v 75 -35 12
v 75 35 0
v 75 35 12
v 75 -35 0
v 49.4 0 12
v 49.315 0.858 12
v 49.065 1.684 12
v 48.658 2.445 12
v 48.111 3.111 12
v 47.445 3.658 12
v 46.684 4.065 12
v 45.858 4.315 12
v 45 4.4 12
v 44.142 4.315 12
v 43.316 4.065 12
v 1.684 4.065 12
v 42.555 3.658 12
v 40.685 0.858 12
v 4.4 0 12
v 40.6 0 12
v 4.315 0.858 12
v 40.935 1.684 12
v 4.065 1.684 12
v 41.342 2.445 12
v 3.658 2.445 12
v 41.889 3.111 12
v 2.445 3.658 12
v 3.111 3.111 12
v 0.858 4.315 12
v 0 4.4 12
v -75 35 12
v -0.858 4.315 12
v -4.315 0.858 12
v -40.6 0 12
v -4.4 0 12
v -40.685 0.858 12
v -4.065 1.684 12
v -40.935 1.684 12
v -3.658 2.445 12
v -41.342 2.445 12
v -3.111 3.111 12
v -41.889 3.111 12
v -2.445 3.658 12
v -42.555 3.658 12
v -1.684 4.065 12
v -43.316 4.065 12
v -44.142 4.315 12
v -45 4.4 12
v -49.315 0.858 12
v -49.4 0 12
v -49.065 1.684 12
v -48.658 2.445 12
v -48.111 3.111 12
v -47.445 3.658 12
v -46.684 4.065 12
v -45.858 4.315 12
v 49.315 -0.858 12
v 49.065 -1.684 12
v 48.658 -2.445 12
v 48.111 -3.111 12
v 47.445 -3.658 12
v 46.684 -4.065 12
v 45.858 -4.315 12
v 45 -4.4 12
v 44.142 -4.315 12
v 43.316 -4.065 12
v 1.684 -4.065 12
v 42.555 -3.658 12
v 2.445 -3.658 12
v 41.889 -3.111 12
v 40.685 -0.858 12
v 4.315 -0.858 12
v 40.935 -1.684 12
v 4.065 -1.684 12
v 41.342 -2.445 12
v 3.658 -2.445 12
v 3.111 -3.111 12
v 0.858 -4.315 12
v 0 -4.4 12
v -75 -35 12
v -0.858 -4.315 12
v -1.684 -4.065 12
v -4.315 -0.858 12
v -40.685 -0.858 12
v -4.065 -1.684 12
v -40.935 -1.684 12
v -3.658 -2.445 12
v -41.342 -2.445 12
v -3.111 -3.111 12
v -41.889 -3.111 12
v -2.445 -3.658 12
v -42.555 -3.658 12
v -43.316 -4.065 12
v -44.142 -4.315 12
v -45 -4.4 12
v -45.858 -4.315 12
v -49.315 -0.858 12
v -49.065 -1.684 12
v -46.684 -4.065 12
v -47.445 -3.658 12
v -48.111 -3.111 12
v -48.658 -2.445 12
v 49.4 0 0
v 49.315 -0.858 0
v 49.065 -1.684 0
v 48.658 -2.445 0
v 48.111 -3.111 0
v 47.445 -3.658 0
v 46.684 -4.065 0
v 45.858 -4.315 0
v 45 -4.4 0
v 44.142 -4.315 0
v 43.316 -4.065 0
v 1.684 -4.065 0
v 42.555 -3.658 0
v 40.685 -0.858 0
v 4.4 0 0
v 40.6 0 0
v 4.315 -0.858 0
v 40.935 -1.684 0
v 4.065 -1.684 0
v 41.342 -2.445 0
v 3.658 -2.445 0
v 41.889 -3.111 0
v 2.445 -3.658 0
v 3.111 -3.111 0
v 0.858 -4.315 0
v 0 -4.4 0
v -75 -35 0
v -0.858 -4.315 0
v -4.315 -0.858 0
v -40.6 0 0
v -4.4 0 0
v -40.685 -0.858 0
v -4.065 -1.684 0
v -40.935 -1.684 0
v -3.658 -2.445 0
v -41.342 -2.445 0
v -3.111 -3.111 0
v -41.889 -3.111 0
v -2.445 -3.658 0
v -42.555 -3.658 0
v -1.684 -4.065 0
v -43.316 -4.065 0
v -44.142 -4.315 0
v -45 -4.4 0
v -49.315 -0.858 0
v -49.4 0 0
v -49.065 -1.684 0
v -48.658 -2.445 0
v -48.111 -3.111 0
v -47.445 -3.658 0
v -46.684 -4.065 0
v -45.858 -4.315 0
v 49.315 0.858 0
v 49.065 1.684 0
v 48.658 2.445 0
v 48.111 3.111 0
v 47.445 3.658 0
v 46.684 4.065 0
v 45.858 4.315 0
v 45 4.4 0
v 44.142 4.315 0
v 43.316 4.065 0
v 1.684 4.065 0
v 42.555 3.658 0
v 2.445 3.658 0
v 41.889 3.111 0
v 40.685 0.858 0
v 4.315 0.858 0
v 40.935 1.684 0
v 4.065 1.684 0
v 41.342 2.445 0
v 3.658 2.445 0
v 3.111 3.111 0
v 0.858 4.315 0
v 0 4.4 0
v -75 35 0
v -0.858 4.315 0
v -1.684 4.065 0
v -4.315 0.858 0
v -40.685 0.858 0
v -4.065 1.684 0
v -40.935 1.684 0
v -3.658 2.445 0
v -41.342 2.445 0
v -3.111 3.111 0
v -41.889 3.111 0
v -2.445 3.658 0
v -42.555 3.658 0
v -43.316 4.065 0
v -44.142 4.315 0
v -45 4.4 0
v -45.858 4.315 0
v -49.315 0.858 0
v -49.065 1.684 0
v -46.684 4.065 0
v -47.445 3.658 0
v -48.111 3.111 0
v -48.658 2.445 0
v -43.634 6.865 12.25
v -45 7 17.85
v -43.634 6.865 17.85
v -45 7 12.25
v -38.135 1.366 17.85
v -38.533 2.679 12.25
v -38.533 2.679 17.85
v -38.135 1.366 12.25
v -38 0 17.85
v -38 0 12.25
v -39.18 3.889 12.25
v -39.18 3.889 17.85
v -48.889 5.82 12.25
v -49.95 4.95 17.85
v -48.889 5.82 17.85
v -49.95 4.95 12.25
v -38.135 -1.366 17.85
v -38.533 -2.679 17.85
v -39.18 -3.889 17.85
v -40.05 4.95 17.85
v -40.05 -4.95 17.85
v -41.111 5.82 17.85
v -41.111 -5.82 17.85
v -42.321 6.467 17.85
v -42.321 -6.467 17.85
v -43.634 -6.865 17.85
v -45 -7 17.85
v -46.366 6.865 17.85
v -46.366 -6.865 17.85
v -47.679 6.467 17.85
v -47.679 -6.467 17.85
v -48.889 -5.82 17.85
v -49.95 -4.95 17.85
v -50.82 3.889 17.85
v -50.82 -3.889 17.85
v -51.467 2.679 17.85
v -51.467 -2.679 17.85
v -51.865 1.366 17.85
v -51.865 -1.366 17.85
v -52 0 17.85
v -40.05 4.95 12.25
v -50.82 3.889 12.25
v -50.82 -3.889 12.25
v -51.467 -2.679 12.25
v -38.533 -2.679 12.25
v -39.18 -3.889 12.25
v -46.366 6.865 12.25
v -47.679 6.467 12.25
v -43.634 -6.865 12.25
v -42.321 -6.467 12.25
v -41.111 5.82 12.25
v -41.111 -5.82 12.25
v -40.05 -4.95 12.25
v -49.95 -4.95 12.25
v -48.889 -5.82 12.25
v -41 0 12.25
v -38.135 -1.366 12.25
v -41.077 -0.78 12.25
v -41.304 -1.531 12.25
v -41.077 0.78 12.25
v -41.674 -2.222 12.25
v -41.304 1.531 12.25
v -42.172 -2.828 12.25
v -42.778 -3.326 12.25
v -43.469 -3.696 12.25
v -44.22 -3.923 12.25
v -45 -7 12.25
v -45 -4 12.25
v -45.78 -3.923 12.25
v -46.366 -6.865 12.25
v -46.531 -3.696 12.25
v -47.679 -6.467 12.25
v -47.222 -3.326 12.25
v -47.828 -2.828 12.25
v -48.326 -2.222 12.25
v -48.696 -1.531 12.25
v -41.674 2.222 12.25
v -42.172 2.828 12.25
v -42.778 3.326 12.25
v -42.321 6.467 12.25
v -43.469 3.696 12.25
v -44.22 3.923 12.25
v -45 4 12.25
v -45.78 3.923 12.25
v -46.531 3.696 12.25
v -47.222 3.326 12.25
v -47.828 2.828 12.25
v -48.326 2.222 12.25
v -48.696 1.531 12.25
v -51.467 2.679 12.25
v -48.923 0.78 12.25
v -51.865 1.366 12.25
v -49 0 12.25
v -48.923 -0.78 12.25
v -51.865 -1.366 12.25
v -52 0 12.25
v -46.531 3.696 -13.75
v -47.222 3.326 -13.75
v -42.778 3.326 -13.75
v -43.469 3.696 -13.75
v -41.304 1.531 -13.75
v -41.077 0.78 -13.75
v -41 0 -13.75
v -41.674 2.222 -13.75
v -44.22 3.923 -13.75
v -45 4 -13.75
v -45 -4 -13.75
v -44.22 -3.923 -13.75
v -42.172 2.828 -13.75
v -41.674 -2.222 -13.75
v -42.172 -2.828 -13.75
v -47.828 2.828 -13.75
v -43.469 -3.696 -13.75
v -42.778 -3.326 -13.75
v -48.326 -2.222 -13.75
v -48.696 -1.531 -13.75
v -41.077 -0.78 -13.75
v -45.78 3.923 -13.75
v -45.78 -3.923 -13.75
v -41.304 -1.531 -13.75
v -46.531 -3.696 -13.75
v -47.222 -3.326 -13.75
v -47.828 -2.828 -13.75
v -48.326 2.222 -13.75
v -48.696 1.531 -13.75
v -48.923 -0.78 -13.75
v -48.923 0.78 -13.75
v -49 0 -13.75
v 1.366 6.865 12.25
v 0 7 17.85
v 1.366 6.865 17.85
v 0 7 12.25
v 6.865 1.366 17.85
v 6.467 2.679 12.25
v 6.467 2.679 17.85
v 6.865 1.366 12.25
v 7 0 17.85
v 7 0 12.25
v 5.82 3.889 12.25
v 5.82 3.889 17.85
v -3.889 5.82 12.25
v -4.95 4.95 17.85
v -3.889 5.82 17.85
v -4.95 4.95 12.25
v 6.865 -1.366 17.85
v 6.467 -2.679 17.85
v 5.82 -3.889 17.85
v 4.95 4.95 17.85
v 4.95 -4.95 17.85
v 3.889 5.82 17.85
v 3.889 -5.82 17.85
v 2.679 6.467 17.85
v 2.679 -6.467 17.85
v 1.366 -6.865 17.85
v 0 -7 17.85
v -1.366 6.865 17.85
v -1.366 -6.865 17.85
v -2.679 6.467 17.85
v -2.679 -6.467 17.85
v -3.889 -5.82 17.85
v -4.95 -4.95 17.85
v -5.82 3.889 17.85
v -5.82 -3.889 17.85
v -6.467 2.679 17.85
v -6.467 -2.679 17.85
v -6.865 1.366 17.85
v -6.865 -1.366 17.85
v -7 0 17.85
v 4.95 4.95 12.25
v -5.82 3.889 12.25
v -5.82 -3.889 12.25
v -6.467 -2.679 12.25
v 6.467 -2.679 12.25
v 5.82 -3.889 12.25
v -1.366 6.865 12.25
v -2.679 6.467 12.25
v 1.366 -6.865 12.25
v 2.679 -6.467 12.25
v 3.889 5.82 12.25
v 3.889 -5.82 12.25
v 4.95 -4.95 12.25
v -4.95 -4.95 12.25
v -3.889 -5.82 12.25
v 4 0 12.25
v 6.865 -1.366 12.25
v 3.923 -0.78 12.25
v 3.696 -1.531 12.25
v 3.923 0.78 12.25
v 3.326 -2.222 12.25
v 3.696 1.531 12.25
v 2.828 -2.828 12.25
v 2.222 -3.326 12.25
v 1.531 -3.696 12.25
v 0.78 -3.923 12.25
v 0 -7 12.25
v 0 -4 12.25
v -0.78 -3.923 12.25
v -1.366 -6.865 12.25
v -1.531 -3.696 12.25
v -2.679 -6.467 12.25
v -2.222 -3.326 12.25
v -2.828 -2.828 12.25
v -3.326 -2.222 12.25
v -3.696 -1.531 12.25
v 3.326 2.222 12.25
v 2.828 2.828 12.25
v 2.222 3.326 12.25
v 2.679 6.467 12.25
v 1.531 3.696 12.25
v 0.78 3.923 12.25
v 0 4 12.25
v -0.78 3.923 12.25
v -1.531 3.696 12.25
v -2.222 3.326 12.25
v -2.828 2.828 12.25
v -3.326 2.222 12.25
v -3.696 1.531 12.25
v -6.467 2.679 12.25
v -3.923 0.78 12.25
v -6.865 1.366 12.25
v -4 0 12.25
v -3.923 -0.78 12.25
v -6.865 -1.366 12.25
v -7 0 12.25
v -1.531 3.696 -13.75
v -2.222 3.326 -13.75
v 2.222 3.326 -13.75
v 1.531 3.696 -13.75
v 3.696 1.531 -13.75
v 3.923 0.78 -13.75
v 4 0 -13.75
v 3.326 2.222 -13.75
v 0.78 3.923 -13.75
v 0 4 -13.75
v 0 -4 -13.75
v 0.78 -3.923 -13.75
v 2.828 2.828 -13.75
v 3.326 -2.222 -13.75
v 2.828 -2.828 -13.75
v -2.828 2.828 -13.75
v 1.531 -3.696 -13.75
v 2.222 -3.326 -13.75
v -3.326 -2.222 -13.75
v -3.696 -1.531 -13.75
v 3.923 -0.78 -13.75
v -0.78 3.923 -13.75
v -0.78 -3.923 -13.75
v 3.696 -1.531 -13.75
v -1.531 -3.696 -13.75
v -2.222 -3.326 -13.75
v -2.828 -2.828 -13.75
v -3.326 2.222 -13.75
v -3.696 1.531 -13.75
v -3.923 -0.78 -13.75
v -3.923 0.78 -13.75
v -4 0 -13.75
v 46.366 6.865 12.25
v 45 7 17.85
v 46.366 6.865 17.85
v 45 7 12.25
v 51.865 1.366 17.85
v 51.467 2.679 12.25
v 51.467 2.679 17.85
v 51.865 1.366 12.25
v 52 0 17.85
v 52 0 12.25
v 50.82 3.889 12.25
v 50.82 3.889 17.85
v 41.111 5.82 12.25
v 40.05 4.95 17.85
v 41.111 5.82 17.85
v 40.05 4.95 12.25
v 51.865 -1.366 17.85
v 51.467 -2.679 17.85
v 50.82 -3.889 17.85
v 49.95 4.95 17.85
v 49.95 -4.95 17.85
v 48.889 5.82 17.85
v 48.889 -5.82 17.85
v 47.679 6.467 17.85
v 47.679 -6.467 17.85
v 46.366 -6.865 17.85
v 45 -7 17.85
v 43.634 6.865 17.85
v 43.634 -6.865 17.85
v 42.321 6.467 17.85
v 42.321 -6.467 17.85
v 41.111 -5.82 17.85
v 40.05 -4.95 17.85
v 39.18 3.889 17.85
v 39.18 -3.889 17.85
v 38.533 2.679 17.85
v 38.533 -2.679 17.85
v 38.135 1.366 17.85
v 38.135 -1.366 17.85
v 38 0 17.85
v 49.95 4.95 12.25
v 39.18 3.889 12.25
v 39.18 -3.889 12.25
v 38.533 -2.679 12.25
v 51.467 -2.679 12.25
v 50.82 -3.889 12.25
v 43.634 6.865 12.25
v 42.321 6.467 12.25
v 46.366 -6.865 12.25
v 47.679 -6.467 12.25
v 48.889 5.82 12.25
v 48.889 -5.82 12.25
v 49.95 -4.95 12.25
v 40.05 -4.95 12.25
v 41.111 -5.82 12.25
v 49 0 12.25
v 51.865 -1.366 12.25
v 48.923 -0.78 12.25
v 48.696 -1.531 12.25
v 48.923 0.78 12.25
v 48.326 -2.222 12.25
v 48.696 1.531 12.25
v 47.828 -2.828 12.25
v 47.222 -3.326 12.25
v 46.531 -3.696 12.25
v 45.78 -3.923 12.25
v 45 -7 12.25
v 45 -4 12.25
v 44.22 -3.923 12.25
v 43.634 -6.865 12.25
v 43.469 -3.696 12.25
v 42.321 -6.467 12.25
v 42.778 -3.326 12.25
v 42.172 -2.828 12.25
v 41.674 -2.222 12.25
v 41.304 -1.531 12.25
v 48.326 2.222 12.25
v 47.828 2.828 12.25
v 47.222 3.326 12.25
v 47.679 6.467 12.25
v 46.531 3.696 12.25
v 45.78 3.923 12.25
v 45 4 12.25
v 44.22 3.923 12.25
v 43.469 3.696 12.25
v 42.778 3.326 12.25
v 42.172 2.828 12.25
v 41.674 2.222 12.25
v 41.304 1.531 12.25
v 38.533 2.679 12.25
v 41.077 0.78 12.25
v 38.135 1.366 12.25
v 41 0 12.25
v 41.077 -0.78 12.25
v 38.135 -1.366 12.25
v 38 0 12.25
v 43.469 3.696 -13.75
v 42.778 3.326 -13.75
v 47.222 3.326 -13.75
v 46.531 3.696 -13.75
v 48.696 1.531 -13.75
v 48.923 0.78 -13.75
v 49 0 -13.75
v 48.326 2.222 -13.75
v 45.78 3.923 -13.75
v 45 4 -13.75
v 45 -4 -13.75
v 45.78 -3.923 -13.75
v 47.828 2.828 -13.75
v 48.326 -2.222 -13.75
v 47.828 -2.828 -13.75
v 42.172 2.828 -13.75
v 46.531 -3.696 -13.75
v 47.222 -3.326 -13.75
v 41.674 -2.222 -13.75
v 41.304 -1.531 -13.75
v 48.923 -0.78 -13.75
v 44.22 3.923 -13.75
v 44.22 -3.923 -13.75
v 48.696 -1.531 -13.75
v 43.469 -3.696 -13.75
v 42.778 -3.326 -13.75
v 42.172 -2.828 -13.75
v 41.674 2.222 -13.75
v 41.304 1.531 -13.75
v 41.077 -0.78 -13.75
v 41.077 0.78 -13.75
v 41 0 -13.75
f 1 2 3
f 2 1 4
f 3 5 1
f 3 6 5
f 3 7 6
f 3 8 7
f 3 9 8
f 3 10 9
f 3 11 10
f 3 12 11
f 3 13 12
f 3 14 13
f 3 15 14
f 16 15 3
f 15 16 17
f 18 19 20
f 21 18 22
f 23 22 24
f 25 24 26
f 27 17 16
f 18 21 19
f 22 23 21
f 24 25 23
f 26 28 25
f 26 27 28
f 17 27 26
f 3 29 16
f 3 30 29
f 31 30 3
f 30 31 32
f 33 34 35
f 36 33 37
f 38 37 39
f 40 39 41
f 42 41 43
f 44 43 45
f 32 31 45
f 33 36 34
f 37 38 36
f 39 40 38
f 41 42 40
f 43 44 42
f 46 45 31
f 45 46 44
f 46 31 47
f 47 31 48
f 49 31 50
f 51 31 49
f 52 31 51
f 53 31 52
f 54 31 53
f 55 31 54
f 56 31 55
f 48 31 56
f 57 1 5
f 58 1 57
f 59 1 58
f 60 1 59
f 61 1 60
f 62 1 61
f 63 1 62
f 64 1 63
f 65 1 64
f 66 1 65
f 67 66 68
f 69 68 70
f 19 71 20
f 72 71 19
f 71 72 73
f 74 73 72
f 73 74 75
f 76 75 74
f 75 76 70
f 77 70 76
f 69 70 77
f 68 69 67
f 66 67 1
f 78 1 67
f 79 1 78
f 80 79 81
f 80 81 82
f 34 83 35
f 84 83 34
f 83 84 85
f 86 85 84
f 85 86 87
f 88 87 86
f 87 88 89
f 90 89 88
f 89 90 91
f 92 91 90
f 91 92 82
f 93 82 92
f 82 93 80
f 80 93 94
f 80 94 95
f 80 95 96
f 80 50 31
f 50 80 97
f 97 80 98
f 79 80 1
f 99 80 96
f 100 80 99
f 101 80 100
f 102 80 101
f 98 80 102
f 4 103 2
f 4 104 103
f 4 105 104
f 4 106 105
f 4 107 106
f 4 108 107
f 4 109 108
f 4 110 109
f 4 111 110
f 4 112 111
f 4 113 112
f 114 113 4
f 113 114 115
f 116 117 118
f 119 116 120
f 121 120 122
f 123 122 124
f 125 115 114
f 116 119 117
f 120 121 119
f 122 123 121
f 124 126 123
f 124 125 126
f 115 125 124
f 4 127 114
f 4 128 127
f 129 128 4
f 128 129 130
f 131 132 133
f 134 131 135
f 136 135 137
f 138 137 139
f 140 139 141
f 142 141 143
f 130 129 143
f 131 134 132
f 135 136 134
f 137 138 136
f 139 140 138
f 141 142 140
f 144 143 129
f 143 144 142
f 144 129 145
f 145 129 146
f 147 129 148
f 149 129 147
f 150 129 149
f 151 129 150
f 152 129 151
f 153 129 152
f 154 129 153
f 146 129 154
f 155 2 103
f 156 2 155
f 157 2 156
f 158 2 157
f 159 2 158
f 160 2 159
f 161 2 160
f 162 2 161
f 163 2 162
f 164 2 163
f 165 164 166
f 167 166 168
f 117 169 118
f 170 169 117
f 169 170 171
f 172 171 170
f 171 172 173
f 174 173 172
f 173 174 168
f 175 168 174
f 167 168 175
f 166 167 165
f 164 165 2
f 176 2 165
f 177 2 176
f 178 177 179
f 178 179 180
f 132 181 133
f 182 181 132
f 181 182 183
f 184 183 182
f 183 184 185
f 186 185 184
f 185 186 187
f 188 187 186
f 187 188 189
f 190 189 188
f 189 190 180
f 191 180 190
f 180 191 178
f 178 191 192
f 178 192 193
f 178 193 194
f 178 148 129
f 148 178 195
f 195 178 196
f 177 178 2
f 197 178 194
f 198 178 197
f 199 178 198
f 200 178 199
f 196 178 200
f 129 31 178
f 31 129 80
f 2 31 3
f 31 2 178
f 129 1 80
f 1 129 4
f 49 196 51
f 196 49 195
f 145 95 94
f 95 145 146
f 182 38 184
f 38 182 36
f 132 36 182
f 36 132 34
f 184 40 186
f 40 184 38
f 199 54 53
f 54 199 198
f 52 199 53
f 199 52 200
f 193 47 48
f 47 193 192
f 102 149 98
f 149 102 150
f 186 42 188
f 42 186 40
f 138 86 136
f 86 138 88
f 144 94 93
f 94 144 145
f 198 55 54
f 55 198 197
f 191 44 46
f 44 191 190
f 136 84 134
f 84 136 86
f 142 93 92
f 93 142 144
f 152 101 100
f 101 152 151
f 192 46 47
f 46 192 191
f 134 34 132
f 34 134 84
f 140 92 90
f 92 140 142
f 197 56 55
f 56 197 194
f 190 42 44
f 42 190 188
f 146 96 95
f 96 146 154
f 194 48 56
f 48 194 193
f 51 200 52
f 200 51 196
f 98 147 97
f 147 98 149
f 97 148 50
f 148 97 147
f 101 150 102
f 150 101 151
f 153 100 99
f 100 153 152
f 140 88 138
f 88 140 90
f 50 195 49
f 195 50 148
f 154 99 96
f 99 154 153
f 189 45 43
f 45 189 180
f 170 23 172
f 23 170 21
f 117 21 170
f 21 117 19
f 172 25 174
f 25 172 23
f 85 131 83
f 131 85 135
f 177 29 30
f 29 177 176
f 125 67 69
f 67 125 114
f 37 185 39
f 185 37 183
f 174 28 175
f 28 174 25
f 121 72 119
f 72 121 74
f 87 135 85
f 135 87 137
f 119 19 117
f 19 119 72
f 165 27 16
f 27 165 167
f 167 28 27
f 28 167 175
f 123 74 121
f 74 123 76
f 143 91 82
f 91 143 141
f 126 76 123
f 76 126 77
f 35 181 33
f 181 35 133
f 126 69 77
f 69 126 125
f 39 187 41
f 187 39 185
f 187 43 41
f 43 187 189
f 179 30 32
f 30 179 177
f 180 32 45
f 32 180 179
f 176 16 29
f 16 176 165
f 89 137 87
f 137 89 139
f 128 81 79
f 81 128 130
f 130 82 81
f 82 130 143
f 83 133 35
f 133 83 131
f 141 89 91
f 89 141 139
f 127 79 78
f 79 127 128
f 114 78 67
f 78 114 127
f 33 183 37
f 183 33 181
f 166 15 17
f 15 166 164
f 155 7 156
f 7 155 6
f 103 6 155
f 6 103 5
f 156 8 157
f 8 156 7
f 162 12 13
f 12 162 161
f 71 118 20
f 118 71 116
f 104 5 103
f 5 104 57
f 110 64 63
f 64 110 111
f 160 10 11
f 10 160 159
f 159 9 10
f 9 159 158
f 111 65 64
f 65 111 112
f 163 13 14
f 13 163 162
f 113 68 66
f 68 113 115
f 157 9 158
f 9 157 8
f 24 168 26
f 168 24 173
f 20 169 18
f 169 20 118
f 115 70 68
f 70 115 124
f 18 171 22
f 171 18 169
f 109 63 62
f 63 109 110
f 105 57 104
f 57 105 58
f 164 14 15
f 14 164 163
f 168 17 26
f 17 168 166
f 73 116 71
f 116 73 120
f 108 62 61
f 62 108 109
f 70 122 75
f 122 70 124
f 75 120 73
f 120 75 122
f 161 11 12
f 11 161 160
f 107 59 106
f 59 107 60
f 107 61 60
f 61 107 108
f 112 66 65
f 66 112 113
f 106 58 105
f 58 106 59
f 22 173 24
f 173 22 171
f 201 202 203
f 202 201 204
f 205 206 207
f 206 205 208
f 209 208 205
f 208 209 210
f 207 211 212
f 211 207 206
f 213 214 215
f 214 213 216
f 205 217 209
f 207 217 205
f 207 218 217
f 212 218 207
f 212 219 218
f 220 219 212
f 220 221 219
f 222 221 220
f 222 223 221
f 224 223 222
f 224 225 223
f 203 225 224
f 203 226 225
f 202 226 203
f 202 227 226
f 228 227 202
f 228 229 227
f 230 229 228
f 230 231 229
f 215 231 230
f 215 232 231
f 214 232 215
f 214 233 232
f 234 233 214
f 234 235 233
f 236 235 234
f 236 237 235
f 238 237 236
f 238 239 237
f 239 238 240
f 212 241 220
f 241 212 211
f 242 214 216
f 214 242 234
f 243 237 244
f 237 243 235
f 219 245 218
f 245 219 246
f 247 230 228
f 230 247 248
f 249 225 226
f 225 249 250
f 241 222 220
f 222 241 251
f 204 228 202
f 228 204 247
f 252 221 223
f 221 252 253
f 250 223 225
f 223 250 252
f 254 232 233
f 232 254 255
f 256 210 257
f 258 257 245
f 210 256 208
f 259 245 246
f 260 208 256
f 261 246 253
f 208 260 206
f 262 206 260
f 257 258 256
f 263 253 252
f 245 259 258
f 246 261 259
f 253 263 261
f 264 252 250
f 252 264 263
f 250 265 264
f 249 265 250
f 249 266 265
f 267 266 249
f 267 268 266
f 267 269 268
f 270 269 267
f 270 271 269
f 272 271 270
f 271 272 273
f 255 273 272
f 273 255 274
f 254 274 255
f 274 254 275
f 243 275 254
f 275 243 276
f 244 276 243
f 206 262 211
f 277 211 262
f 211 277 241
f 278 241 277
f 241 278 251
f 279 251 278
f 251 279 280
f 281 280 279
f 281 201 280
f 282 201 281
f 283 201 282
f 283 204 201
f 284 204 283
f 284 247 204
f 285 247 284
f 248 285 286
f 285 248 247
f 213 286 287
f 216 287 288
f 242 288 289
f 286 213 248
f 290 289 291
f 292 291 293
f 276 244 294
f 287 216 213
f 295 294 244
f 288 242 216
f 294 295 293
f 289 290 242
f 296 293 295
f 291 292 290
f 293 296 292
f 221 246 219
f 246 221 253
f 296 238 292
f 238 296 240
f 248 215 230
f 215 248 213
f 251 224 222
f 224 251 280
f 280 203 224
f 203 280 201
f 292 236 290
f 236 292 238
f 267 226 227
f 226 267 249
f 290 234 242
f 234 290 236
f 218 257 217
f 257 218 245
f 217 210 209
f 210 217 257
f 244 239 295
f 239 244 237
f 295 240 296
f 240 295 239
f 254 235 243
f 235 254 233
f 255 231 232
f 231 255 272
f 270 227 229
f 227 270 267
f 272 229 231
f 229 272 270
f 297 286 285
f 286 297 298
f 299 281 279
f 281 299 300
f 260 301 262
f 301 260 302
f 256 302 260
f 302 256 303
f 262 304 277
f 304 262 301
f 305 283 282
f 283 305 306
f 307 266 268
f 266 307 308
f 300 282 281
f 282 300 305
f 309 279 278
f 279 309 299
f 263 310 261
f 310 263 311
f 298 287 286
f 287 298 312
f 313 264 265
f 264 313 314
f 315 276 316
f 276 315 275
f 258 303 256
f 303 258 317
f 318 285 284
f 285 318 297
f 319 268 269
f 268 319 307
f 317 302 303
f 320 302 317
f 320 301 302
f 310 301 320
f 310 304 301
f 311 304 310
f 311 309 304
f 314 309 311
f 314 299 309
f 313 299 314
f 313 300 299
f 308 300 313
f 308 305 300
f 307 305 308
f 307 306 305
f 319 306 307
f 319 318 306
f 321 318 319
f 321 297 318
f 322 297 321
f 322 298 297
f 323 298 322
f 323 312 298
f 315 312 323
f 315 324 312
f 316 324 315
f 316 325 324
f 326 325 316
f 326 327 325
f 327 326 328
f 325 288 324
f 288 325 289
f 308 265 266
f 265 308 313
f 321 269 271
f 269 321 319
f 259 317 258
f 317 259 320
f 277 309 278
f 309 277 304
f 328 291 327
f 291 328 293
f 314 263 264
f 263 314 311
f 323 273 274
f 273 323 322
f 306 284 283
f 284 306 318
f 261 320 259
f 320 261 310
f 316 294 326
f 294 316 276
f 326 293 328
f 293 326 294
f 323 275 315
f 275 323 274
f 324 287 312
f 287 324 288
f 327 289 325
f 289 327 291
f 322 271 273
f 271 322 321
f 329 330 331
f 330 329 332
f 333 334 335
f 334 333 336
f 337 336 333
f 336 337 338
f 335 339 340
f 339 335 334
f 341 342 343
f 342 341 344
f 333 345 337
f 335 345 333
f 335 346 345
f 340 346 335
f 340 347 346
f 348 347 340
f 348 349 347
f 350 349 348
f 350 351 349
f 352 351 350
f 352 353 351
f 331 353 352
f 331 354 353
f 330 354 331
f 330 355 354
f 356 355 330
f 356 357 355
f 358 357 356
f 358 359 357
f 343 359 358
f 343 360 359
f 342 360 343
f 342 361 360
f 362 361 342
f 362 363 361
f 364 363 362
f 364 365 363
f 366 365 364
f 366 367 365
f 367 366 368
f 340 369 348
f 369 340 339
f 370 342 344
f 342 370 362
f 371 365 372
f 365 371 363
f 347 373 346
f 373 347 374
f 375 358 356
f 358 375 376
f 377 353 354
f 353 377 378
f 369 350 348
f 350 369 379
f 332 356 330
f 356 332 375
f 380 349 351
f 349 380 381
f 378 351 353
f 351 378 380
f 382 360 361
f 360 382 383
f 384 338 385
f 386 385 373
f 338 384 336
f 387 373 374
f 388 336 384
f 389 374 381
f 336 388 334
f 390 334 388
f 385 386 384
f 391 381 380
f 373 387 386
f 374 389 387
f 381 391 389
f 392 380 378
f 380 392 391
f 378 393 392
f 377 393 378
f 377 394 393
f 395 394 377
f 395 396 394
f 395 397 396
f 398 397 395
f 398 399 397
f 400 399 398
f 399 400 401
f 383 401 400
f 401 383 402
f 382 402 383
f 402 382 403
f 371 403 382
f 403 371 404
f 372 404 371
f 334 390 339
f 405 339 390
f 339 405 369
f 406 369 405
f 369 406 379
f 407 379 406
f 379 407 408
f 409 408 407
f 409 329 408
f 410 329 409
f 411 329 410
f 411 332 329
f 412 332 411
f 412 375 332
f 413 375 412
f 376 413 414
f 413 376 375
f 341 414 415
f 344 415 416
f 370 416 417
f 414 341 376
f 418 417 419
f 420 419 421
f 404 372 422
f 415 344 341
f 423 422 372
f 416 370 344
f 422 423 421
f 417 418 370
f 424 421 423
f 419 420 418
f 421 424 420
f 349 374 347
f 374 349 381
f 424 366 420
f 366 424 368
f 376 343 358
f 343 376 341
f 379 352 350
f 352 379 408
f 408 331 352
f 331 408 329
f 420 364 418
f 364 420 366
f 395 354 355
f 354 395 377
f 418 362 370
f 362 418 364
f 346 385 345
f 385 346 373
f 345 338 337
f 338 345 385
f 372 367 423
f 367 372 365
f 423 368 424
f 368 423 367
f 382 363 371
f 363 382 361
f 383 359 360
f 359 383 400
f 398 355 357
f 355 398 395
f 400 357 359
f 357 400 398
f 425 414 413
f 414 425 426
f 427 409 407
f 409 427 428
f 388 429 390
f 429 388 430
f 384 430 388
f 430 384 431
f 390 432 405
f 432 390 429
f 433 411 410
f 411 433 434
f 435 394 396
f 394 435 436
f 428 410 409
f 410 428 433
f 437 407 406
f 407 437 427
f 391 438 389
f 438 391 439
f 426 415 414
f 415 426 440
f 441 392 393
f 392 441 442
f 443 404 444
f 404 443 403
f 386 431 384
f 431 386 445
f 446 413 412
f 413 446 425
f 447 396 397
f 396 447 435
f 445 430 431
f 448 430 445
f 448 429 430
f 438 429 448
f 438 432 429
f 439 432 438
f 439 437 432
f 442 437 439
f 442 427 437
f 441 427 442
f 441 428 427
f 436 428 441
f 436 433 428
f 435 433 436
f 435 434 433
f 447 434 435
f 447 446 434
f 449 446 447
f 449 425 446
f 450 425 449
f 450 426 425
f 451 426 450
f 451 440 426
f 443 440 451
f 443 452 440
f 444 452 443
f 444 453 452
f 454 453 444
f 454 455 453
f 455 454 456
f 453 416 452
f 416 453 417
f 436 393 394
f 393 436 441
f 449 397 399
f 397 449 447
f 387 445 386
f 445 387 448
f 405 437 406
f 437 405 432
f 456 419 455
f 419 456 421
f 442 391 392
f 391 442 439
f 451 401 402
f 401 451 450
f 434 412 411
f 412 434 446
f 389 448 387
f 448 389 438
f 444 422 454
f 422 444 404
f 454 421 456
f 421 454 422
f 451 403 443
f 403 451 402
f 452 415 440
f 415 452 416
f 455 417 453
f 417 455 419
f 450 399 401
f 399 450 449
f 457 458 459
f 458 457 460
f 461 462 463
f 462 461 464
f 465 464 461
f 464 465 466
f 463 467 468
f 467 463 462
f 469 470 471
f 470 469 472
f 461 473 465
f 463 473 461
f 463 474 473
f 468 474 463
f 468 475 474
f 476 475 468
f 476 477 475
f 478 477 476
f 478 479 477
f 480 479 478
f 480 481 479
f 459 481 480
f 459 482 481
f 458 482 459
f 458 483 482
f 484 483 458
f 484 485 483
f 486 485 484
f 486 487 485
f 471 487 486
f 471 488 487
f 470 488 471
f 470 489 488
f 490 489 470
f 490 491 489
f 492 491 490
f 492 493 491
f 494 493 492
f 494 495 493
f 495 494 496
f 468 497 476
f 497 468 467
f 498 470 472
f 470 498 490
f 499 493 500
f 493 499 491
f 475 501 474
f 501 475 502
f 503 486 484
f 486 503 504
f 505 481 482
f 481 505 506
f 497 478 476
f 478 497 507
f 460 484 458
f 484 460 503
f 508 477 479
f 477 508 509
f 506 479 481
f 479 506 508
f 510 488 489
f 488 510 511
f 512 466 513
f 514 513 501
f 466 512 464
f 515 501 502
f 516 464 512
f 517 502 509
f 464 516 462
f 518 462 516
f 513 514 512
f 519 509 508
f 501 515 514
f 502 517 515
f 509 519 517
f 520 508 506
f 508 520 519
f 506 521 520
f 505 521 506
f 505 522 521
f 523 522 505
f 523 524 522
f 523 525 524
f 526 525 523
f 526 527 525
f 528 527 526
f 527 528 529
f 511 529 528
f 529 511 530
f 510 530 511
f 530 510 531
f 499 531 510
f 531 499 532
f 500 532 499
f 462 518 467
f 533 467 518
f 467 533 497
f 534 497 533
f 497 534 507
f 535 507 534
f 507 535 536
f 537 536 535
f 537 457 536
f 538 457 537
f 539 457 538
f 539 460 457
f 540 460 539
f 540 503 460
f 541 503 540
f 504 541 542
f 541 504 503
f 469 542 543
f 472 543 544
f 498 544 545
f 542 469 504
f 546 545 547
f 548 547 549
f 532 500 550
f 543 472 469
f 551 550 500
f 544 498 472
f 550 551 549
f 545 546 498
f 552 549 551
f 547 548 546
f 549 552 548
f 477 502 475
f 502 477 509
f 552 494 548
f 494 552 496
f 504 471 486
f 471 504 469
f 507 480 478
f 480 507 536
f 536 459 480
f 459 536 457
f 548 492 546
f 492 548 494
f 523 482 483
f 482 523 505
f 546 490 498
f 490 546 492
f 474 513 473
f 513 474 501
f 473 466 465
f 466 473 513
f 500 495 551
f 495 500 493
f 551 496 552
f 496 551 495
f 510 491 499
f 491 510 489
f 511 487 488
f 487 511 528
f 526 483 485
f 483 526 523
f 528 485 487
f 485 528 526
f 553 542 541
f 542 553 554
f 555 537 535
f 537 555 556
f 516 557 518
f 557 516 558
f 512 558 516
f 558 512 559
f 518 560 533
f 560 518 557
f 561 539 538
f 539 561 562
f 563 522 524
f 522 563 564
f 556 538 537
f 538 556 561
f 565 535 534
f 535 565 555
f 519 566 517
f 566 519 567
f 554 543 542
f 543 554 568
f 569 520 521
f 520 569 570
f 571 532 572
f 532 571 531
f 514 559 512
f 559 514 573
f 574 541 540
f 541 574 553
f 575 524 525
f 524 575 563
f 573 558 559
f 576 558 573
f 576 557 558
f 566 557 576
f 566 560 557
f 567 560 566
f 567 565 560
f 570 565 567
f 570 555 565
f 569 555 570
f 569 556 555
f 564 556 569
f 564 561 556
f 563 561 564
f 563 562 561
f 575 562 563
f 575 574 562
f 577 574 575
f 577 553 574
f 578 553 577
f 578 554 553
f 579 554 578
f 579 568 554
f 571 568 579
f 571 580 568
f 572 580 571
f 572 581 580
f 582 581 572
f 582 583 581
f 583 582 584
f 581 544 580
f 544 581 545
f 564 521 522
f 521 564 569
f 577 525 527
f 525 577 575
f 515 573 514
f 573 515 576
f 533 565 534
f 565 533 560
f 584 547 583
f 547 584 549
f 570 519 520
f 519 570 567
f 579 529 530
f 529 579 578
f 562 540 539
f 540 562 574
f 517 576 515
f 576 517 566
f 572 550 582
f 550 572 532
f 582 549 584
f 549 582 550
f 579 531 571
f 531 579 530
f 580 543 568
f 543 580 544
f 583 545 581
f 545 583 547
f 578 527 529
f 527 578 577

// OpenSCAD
$fn = 32;

// ------------------------------------------------------------------------
// Bolted plate: 150 x 70 x 12 mm plate, 3 fasteners
// Every part is its own module, assembly() places them once.
// ------------------------------------------------------------------------

// --- part 1 ---
module plate() {
  difference() {
    translate([-75, -35, 0]) cube([150, 70, 12]);
    translate([-45, 0, -1]) cylinder(h = 14, d = 8.8);
    translate([0, 0, -1]) cylinder(h = 14, d = 8.8);
    translate([45, 0, -1]) cylinder(h = 14, d = 8.8);
  }
}

// --- part 2 ---
module bolt1() {
  cylinder(h = 5.6, d = 14);
  translate([0, 0, -26]) cylinder(h = 26, d = 8);
}

// --- part 3 ---
module bolt2() {
  cylinder(h = 5.6, d = 14);
  translate([0, 0, -26]) cylinder(h = 26, d = 8);
}

// --- part 4 ---
module bolt3() {
  cylinder(h = 5.6, d = 14);
  translate([0, 0, -26]) cylinder(h = 26, d = 8);
}

// --- assembly ---
module assembly() {
  translate([0, 0, 0]) rotate([0, 0, 0]) plate();
  translate([-45, 0, 12.25]) rotate([0, 0, 0]) bolt1();
  translate([0, 0, 12.25]) rotate([0, 0, 0]) bolt2();
  translate([45, 0, 12.25]) rotate([0, 0, 0]) bolt3();
}

assembly();
